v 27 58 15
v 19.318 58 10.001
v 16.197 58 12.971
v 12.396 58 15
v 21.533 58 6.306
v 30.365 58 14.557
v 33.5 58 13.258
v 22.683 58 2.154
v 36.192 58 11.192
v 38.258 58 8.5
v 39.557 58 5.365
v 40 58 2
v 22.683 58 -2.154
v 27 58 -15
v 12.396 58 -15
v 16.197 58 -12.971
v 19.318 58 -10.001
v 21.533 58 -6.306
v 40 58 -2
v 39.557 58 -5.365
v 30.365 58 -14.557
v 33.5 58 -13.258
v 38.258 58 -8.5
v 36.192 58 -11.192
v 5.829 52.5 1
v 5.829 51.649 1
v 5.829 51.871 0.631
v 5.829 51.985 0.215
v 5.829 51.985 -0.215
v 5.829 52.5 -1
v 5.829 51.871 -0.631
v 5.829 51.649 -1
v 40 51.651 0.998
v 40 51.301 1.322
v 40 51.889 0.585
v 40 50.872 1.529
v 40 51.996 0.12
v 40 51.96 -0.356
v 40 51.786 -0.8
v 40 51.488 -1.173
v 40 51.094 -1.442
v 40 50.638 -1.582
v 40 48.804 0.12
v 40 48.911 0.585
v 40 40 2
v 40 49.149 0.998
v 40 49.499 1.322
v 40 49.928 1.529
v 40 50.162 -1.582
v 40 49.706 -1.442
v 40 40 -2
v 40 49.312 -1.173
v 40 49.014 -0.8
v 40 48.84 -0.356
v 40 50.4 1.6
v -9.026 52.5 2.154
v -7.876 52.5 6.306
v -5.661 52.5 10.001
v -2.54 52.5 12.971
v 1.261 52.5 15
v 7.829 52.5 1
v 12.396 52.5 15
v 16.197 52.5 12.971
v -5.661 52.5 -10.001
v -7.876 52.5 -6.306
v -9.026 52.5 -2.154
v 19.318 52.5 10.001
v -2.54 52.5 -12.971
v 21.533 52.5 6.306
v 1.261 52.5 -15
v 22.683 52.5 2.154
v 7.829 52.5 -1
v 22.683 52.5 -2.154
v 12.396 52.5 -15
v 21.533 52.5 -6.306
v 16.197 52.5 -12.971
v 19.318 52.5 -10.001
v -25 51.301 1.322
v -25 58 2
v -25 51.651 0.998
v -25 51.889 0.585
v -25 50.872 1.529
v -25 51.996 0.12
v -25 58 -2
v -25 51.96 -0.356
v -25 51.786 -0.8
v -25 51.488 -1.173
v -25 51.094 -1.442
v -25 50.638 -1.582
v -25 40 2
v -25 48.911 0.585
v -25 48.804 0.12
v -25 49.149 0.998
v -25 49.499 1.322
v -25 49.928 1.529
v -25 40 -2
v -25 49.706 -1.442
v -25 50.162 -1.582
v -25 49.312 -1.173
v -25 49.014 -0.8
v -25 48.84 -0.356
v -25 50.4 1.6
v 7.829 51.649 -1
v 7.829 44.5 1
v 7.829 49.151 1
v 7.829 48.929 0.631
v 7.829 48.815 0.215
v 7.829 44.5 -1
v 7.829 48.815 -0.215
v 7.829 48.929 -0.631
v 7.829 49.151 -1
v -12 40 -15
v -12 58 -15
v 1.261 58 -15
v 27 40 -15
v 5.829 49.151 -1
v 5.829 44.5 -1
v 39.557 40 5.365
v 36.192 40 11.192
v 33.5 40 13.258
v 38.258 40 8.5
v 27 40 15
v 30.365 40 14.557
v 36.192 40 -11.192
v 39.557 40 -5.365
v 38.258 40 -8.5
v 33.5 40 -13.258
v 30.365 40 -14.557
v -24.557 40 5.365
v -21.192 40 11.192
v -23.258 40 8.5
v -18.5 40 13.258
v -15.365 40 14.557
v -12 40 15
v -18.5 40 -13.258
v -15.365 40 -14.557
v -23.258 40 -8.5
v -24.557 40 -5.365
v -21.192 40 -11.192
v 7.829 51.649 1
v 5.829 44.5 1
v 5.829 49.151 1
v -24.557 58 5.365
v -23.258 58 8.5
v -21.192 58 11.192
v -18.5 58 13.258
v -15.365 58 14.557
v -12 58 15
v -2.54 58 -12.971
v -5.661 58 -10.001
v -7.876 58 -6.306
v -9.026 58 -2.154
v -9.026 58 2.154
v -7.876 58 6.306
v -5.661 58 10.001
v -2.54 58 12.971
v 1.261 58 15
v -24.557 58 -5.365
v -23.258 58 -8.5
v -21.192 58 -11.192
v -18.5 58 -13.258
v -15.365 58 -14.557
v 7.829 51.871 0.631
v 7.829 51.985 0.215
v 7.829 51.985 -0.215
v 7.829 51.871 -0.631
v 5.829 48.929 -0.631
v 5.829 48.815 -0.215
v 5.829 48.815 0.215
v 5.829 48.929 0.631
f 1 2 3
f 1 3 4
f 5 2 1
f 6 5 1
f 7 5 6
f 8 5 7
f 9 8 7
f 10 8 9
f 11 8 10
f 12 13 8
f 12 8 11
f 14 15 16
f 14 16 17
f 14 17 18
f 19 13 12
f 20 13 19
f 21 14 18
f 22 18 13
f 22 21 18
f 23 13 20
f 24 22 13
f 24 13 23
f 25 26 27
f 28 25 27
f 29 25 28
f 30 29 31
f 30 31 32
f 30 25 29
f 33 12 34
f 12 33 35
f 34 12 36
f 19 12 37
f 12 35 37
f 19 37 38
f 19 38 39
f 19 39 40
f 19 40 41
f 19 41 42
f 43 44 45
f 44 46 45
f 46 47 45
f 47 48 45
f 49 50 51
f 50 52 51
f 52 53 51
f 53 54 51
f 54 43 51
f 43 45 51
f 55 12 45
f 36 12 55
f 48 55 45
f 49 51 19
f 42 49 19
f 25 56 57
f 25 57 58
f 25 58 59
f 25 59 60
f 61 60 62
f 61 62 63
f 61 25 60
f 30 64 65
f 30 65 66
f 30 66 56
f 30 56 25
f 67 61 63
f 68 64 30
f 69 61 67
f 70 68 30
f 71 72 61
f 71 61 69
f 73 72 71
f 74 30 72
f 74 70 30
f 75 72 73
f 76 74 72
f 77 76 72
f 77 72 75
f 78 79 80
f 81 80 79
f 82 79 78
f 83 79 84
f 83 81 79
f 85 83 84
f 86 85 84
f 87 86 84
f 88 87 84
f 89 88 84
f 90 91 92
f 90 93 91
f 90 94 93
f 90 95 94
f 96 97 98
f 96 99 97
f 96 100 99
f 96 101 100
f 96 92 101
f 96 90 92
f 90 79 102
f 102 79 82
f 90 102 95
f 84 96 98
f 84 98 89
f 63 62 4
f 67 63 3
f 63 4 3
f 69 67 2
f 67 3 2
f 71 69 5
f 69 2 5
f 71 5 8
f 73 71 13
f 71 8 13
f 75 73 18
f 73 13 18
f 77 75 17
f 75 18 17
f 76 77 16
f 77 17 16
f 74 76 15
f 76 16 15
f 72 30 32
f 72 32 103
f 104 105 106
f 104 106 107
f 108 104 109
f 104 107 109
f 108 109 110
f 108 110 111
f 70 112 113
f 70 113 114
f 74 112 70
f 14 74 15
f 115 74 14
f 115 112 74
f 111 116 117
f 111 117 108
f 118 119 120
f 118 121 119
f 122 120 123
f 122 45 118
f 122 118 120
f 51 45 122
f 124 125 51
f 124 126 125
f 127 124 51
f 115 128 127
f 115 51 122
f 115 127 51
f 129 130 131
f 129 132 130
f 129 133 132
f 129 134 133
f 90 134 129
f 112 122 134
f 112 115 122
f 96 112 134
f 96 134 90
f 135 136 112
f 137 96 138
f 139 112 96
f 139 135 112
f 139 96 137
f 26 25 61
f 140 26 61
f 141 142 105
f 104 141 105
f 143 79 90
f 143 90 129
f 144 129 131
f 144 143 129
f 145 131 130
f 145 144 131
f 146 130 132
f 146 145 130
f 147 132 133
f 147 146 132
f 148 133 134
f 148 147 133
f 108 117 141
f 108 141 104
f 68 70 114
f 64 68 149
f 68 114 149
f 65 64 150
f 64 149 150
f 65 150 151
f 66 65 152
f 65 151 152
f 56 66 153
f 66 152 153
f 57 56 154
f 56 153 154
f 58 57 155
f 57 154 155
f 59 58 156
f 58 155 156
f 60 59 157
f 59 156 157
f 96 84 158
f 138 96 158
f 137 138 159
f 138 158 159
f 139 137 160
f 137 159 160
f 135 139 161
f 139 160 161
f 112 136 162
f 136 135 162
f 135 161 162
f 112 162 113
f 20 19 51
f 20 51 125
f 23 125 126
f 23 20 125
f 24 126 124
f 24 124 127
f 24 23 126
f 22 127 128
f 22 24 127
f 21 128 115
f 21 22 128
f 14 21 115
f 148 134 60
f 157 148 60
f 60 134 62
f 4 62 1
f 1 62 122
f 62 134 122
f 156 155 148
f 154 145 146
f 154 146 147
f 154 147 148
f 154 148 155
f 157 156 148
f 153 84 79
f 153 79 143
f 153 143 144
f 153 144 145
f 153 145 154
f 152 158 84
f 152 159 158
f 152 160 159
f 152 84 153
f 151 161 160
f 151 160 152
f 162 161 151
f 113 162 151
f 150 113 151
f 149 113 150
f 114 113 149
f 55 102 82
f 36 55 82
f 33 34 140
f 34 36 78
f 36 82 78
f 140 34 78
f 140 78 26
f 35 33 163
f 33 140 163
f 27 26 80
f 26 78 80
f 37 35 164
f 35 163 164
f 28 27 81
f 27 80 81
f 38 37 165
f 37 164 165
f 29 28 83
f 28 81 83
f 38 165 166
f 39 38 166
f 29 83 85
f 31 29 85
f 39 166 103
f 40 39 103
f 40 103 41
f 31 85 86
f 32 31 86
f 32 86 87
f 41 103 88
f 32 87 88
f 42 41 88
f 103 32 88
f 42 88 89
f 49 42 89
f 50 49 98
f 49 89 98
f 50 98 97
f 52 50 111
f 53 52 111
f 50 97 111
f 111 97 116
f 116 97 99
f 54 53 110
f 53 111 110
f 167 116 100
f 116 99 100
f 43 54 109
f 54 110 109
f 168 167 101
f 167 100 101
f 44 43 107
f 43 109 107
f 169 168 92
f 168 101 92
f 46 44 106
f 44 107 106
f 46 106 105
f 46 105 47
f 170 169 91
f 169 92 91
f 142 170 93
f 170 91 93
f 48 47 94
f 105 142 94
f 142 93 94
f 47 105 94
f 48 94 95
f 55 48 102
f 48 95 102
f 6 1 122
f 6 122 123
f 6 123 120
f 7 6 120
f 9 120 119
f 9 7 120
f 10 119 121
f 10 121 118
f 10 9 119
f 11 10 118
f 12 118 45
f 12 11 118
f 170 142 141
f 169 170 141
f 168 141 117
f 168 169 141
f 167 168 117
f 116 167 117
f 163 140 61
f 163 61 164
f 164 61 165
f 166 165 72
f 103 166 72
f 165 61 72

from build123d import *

# Parameters (mm, degrees)
SKETCH1_W           = 65
SKETCH1_H           = 30
BOSS_EXTRUDE1_DEPTH = 58
FILLET1_R           = 13
SKETCH15_W          = 83.696095513
SKETCH15_H          = 31.69844841
CUT_EXTRUDE7_DEPTH  = 50
SKETCH18_R          = 16
CUT_EXTRUDE10_DEPTH = 5.5
SKETCH3_R           = 1.6
CUT_EXTRUDE12_DEPTH = 89.396832522
SKETCH21_W          = 2
SKETCH21_H          = 2
CUT_EXTRUDE13_DEPTH = 8


with BuildPart() as part:
    # Sketch1 → Boss-Extrude1 (new body)
    with BuildSketch(Plane(origin=(0, 0, 0), x_dir=(1, 0, 0), z_dir=(0, 1, 0))):
        with Locations((7.5, 0)):
            Rectangle(SKETCH1_W, SKETCH1_H)
    extrude(amount=BOSS_EXTRUDE1_DEPTH)

    # Fillet1
    fillet1_edges = [part.edges().sort_by_distance(p)[0] for p in [
        (40, 29, 15),
        (-25, 29, 15),
        (-25, 29, -15),
        (40, 29, -15),
    ]]
    fillet(fillet1_edges, radius=FILLET1_R)

    # Sketch15 → Cut-Extrude7 (cut)
    with BuildSketch(Plane(origin=(0, -10, 0), x_dir=(-1, 0, 0), z_dir=(0, -1, 0))):
        with Locations((-0.057440767, 0.030479277)):
            Rectangle(SKETCH15_W, SKETCH15_H)
    extrude(amount=-CUT_EXTRUDE7_DEPTH, mode=Mode.SUBTRACT)

    # Sketch18 → Cut-Extrude10 (cut)
    with BuildSketch(Plane(origin=(0, 58, 0), x_dir=(1, 0, 0), z_dir=(0, 1, 0))):
        with Locations((6.828508286, 0)):
            Circle(SKETCH18_R)
    extrude(amount=-CUT_EXTRUDE10_DEPTH, mode=Mode.SUBTRACT)

    # Sketch3 → Cut-Extrude12 (cut, through all)
    with BuildSketch(Plane.ZY.offset(25)):
        with Locations((0, 50.4)):
            Circle(SKETCH3_R)
    extrude(amount=-CUT_EXTRUDE12_DEPTH, mode=Mode.SUBTRACT)

    # Sketch21 → Cut-Extrude13 (cut)
    with BuildSketch(Plane(origin=(0, 52.5, 0), x_dir=(1, 0, 0), z_dir=(0, 1, 0))):
        with Locations((6.828508286, 0)):
            Rectangle(SKETCH21_W, SKETCH21_H)
    extrude(amount=-CUT_EXTRUDE13_DEPTH, mode=Mode.SUBTRACT)


solid = part.part
